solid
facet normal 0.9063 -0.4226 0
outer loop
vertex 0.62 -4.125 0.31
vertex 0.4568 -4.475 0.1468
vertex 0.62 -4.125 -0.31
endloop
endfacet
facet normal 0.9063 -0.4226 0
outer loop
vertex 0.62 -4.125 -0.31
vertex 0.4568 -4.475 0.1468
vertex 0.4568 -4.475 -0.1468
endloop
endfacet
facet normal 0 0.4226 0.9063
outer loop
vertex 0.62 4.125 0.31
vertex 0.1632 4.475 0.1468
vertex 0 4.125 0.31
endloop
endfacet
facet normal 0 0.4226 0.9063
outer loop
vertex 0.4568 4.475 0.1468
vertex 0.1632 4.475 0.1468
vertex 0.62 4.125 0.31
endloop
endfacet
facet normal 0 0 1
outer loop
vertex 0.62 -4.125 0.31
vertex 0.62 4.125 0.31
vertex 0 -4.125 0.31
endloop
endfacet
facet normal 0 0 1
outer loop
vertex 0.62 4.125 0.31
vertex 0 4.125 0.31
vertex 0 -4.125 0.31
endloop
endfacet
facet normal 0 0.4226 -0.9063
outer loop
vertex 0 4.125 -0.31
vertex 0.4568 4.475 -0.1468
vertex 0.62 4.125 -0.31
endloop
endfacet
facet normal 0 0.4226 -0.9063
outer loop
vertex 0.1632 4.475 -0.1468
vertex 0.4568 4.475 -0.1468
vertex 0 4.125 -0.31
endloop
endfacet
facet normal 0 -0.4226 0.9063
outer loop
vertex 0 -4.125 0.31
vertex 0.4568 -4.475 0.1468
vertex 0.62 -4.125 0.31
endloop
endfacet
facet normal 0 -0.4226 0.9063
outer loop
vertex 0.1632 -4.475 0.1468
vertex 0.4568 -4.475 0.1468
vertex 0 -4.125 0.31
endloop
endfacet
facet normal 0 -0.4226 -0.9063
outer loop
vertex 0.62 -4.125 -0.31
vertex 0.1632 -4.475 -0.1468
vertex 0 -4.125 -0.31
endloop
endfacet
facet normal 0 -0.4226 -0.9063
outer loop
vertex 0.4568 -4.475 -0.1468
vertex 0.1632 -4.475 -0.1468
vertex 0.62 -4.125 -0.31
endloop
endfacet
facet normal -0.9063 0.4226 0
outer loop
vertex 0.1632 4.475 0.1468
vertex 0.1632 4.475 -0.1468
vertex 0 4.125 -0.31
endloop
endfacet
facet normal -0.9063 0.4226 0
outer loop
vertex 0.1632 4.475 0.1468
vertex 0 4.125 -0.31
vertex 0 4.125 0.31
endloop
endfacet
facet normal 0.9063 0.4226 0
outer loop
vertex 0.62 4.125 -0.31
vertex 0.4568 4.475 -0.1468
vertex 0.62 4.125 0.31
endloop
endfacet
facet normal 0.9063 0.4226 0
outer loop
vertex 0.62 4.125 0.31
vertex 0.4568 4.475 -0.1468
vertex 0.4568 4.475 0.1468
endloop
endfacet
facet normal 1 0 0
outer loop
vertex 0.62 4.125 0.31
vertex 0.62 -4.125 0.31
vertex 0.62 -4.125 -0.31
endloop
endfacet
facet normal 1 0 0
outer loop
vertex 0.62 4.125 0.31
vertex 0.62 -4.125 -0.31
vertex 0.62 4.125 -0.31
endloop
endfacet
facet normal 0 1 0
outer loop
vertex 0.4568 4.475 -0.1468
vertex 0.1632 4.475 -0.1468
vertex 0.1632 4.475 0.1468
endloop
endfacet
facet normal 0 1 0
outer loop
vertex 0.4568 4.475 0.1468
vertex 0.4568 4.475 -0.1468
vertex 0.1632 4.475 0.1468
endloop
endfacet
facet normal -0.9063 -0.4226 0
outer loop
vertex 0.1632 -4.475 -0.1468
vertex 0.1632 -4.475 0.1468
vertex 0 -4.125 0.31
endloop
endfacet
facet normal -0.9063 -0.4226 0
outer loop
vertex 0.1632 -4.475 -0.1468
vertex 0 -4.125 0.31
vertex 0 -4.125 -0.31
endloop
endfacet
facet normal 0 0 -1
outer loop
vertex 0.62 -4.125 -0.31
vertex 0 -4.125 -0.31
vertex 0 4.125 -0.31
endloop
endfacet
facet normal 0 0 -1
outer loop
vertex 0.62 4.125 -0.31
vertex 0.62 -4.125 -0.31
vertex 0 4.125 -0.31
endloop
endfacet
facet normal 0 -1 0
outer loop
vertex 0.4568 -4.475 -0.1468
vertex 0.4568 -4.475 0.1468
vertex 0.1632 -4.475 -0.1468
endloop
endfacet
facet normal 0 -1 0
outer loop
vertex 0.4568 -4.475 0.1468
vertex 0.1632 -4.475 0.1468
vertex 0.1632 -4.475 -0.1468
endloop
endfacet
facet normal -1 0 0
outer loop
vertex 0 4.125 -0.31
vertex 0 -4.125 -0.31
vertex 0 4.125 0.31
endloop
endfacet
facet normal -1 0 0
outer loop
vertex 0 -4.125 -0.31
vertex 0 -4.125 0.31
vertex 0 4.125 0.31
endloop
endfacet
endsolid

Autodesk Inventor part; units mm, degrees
ref_plane "YZ Plane" through (0, 0, 0) normal (1, 0, 0) x (0, 1, 0)
ref_plane "XZ Plane" through (0, 0, 0) normal (0, 1, 0) x (-1, 0, 0)
ref_plane "XY Plane" through (0, 0, 0) normal (0, 0, 1) x (1, 0, 0)
sketch "Sketch1" plane through (0, 0, 0) normal (1, 0, 0) x (0, 1, 0)
  line L0 (4.475, 0.31) -> (-4.475, 0.31)
  line L1 (-4.475, 0.31) -> (-4.475, -0.31)
  line L2 (-4.475, -0.31) -> (4.475, -0.31)
  line L3 (4.475, -0.31) -> (4.475, 0.31)
  line L4 (4.475, 0.31) -> (-4.475, -0.31) construction
  line L5 (-4.475, 0.31) -> (4.475, -0.31) construction
  point P0 (0, 0)
  dimension "d0" = 8.95
  dimension "d1" = 0.62
extrude "Extrusion1" add sketch "Sketch1" along normal blind 0.62
chamfer "Chamfer1" distance 0.35 angle 25 1 edges at (0.31, 4.475, 0.31) measured on face at (0.4133, 1.4917, 0.31)
chamfer "Chamfer2" distance 0.35 angle 25 1 edges at (0.62, 4.475, -0.0816) measured on face at (0.62, 1.375, -0.1033)
chamfer "Chamfer3" distance 0.35 angle 25 1 edges at (0.2284, 4.475, -0.31) measured on face at (0.2067, 1.375, -0.31)
chamfer "Chamfer4" distance 0.35 angle 25 1 edges at (0, 4.475, 0) measured on face at (0, 1.2583, -0.1033)
chamfer "Chamfer5" distance 0.35 angle 25 1 edges at (0.31, -4.475, -0.31) measured on face at (0.2067, -1.6083, -0.31)
chamfer "Chamfer6" distance 0.35 angle 25 1 edges at (0.62, -4.475, 0.0816) measured on face at (0.62, -1.4917, 0.1033)
chamfer "Chamfer7" distance 0.35 angle 25 1 edges at (0.2284, -4.475, 0.31) measured on face at (0.2067, -1.4917, 0.31)
chamfer "Chamfer8" distance 0.35 angle 25 1 edges at (0, -4.475, 0) measured on face at (0, 1.375, -0.1033)
properties part number "Pin_Header" material "Nickel-Copper Alloy 400"
